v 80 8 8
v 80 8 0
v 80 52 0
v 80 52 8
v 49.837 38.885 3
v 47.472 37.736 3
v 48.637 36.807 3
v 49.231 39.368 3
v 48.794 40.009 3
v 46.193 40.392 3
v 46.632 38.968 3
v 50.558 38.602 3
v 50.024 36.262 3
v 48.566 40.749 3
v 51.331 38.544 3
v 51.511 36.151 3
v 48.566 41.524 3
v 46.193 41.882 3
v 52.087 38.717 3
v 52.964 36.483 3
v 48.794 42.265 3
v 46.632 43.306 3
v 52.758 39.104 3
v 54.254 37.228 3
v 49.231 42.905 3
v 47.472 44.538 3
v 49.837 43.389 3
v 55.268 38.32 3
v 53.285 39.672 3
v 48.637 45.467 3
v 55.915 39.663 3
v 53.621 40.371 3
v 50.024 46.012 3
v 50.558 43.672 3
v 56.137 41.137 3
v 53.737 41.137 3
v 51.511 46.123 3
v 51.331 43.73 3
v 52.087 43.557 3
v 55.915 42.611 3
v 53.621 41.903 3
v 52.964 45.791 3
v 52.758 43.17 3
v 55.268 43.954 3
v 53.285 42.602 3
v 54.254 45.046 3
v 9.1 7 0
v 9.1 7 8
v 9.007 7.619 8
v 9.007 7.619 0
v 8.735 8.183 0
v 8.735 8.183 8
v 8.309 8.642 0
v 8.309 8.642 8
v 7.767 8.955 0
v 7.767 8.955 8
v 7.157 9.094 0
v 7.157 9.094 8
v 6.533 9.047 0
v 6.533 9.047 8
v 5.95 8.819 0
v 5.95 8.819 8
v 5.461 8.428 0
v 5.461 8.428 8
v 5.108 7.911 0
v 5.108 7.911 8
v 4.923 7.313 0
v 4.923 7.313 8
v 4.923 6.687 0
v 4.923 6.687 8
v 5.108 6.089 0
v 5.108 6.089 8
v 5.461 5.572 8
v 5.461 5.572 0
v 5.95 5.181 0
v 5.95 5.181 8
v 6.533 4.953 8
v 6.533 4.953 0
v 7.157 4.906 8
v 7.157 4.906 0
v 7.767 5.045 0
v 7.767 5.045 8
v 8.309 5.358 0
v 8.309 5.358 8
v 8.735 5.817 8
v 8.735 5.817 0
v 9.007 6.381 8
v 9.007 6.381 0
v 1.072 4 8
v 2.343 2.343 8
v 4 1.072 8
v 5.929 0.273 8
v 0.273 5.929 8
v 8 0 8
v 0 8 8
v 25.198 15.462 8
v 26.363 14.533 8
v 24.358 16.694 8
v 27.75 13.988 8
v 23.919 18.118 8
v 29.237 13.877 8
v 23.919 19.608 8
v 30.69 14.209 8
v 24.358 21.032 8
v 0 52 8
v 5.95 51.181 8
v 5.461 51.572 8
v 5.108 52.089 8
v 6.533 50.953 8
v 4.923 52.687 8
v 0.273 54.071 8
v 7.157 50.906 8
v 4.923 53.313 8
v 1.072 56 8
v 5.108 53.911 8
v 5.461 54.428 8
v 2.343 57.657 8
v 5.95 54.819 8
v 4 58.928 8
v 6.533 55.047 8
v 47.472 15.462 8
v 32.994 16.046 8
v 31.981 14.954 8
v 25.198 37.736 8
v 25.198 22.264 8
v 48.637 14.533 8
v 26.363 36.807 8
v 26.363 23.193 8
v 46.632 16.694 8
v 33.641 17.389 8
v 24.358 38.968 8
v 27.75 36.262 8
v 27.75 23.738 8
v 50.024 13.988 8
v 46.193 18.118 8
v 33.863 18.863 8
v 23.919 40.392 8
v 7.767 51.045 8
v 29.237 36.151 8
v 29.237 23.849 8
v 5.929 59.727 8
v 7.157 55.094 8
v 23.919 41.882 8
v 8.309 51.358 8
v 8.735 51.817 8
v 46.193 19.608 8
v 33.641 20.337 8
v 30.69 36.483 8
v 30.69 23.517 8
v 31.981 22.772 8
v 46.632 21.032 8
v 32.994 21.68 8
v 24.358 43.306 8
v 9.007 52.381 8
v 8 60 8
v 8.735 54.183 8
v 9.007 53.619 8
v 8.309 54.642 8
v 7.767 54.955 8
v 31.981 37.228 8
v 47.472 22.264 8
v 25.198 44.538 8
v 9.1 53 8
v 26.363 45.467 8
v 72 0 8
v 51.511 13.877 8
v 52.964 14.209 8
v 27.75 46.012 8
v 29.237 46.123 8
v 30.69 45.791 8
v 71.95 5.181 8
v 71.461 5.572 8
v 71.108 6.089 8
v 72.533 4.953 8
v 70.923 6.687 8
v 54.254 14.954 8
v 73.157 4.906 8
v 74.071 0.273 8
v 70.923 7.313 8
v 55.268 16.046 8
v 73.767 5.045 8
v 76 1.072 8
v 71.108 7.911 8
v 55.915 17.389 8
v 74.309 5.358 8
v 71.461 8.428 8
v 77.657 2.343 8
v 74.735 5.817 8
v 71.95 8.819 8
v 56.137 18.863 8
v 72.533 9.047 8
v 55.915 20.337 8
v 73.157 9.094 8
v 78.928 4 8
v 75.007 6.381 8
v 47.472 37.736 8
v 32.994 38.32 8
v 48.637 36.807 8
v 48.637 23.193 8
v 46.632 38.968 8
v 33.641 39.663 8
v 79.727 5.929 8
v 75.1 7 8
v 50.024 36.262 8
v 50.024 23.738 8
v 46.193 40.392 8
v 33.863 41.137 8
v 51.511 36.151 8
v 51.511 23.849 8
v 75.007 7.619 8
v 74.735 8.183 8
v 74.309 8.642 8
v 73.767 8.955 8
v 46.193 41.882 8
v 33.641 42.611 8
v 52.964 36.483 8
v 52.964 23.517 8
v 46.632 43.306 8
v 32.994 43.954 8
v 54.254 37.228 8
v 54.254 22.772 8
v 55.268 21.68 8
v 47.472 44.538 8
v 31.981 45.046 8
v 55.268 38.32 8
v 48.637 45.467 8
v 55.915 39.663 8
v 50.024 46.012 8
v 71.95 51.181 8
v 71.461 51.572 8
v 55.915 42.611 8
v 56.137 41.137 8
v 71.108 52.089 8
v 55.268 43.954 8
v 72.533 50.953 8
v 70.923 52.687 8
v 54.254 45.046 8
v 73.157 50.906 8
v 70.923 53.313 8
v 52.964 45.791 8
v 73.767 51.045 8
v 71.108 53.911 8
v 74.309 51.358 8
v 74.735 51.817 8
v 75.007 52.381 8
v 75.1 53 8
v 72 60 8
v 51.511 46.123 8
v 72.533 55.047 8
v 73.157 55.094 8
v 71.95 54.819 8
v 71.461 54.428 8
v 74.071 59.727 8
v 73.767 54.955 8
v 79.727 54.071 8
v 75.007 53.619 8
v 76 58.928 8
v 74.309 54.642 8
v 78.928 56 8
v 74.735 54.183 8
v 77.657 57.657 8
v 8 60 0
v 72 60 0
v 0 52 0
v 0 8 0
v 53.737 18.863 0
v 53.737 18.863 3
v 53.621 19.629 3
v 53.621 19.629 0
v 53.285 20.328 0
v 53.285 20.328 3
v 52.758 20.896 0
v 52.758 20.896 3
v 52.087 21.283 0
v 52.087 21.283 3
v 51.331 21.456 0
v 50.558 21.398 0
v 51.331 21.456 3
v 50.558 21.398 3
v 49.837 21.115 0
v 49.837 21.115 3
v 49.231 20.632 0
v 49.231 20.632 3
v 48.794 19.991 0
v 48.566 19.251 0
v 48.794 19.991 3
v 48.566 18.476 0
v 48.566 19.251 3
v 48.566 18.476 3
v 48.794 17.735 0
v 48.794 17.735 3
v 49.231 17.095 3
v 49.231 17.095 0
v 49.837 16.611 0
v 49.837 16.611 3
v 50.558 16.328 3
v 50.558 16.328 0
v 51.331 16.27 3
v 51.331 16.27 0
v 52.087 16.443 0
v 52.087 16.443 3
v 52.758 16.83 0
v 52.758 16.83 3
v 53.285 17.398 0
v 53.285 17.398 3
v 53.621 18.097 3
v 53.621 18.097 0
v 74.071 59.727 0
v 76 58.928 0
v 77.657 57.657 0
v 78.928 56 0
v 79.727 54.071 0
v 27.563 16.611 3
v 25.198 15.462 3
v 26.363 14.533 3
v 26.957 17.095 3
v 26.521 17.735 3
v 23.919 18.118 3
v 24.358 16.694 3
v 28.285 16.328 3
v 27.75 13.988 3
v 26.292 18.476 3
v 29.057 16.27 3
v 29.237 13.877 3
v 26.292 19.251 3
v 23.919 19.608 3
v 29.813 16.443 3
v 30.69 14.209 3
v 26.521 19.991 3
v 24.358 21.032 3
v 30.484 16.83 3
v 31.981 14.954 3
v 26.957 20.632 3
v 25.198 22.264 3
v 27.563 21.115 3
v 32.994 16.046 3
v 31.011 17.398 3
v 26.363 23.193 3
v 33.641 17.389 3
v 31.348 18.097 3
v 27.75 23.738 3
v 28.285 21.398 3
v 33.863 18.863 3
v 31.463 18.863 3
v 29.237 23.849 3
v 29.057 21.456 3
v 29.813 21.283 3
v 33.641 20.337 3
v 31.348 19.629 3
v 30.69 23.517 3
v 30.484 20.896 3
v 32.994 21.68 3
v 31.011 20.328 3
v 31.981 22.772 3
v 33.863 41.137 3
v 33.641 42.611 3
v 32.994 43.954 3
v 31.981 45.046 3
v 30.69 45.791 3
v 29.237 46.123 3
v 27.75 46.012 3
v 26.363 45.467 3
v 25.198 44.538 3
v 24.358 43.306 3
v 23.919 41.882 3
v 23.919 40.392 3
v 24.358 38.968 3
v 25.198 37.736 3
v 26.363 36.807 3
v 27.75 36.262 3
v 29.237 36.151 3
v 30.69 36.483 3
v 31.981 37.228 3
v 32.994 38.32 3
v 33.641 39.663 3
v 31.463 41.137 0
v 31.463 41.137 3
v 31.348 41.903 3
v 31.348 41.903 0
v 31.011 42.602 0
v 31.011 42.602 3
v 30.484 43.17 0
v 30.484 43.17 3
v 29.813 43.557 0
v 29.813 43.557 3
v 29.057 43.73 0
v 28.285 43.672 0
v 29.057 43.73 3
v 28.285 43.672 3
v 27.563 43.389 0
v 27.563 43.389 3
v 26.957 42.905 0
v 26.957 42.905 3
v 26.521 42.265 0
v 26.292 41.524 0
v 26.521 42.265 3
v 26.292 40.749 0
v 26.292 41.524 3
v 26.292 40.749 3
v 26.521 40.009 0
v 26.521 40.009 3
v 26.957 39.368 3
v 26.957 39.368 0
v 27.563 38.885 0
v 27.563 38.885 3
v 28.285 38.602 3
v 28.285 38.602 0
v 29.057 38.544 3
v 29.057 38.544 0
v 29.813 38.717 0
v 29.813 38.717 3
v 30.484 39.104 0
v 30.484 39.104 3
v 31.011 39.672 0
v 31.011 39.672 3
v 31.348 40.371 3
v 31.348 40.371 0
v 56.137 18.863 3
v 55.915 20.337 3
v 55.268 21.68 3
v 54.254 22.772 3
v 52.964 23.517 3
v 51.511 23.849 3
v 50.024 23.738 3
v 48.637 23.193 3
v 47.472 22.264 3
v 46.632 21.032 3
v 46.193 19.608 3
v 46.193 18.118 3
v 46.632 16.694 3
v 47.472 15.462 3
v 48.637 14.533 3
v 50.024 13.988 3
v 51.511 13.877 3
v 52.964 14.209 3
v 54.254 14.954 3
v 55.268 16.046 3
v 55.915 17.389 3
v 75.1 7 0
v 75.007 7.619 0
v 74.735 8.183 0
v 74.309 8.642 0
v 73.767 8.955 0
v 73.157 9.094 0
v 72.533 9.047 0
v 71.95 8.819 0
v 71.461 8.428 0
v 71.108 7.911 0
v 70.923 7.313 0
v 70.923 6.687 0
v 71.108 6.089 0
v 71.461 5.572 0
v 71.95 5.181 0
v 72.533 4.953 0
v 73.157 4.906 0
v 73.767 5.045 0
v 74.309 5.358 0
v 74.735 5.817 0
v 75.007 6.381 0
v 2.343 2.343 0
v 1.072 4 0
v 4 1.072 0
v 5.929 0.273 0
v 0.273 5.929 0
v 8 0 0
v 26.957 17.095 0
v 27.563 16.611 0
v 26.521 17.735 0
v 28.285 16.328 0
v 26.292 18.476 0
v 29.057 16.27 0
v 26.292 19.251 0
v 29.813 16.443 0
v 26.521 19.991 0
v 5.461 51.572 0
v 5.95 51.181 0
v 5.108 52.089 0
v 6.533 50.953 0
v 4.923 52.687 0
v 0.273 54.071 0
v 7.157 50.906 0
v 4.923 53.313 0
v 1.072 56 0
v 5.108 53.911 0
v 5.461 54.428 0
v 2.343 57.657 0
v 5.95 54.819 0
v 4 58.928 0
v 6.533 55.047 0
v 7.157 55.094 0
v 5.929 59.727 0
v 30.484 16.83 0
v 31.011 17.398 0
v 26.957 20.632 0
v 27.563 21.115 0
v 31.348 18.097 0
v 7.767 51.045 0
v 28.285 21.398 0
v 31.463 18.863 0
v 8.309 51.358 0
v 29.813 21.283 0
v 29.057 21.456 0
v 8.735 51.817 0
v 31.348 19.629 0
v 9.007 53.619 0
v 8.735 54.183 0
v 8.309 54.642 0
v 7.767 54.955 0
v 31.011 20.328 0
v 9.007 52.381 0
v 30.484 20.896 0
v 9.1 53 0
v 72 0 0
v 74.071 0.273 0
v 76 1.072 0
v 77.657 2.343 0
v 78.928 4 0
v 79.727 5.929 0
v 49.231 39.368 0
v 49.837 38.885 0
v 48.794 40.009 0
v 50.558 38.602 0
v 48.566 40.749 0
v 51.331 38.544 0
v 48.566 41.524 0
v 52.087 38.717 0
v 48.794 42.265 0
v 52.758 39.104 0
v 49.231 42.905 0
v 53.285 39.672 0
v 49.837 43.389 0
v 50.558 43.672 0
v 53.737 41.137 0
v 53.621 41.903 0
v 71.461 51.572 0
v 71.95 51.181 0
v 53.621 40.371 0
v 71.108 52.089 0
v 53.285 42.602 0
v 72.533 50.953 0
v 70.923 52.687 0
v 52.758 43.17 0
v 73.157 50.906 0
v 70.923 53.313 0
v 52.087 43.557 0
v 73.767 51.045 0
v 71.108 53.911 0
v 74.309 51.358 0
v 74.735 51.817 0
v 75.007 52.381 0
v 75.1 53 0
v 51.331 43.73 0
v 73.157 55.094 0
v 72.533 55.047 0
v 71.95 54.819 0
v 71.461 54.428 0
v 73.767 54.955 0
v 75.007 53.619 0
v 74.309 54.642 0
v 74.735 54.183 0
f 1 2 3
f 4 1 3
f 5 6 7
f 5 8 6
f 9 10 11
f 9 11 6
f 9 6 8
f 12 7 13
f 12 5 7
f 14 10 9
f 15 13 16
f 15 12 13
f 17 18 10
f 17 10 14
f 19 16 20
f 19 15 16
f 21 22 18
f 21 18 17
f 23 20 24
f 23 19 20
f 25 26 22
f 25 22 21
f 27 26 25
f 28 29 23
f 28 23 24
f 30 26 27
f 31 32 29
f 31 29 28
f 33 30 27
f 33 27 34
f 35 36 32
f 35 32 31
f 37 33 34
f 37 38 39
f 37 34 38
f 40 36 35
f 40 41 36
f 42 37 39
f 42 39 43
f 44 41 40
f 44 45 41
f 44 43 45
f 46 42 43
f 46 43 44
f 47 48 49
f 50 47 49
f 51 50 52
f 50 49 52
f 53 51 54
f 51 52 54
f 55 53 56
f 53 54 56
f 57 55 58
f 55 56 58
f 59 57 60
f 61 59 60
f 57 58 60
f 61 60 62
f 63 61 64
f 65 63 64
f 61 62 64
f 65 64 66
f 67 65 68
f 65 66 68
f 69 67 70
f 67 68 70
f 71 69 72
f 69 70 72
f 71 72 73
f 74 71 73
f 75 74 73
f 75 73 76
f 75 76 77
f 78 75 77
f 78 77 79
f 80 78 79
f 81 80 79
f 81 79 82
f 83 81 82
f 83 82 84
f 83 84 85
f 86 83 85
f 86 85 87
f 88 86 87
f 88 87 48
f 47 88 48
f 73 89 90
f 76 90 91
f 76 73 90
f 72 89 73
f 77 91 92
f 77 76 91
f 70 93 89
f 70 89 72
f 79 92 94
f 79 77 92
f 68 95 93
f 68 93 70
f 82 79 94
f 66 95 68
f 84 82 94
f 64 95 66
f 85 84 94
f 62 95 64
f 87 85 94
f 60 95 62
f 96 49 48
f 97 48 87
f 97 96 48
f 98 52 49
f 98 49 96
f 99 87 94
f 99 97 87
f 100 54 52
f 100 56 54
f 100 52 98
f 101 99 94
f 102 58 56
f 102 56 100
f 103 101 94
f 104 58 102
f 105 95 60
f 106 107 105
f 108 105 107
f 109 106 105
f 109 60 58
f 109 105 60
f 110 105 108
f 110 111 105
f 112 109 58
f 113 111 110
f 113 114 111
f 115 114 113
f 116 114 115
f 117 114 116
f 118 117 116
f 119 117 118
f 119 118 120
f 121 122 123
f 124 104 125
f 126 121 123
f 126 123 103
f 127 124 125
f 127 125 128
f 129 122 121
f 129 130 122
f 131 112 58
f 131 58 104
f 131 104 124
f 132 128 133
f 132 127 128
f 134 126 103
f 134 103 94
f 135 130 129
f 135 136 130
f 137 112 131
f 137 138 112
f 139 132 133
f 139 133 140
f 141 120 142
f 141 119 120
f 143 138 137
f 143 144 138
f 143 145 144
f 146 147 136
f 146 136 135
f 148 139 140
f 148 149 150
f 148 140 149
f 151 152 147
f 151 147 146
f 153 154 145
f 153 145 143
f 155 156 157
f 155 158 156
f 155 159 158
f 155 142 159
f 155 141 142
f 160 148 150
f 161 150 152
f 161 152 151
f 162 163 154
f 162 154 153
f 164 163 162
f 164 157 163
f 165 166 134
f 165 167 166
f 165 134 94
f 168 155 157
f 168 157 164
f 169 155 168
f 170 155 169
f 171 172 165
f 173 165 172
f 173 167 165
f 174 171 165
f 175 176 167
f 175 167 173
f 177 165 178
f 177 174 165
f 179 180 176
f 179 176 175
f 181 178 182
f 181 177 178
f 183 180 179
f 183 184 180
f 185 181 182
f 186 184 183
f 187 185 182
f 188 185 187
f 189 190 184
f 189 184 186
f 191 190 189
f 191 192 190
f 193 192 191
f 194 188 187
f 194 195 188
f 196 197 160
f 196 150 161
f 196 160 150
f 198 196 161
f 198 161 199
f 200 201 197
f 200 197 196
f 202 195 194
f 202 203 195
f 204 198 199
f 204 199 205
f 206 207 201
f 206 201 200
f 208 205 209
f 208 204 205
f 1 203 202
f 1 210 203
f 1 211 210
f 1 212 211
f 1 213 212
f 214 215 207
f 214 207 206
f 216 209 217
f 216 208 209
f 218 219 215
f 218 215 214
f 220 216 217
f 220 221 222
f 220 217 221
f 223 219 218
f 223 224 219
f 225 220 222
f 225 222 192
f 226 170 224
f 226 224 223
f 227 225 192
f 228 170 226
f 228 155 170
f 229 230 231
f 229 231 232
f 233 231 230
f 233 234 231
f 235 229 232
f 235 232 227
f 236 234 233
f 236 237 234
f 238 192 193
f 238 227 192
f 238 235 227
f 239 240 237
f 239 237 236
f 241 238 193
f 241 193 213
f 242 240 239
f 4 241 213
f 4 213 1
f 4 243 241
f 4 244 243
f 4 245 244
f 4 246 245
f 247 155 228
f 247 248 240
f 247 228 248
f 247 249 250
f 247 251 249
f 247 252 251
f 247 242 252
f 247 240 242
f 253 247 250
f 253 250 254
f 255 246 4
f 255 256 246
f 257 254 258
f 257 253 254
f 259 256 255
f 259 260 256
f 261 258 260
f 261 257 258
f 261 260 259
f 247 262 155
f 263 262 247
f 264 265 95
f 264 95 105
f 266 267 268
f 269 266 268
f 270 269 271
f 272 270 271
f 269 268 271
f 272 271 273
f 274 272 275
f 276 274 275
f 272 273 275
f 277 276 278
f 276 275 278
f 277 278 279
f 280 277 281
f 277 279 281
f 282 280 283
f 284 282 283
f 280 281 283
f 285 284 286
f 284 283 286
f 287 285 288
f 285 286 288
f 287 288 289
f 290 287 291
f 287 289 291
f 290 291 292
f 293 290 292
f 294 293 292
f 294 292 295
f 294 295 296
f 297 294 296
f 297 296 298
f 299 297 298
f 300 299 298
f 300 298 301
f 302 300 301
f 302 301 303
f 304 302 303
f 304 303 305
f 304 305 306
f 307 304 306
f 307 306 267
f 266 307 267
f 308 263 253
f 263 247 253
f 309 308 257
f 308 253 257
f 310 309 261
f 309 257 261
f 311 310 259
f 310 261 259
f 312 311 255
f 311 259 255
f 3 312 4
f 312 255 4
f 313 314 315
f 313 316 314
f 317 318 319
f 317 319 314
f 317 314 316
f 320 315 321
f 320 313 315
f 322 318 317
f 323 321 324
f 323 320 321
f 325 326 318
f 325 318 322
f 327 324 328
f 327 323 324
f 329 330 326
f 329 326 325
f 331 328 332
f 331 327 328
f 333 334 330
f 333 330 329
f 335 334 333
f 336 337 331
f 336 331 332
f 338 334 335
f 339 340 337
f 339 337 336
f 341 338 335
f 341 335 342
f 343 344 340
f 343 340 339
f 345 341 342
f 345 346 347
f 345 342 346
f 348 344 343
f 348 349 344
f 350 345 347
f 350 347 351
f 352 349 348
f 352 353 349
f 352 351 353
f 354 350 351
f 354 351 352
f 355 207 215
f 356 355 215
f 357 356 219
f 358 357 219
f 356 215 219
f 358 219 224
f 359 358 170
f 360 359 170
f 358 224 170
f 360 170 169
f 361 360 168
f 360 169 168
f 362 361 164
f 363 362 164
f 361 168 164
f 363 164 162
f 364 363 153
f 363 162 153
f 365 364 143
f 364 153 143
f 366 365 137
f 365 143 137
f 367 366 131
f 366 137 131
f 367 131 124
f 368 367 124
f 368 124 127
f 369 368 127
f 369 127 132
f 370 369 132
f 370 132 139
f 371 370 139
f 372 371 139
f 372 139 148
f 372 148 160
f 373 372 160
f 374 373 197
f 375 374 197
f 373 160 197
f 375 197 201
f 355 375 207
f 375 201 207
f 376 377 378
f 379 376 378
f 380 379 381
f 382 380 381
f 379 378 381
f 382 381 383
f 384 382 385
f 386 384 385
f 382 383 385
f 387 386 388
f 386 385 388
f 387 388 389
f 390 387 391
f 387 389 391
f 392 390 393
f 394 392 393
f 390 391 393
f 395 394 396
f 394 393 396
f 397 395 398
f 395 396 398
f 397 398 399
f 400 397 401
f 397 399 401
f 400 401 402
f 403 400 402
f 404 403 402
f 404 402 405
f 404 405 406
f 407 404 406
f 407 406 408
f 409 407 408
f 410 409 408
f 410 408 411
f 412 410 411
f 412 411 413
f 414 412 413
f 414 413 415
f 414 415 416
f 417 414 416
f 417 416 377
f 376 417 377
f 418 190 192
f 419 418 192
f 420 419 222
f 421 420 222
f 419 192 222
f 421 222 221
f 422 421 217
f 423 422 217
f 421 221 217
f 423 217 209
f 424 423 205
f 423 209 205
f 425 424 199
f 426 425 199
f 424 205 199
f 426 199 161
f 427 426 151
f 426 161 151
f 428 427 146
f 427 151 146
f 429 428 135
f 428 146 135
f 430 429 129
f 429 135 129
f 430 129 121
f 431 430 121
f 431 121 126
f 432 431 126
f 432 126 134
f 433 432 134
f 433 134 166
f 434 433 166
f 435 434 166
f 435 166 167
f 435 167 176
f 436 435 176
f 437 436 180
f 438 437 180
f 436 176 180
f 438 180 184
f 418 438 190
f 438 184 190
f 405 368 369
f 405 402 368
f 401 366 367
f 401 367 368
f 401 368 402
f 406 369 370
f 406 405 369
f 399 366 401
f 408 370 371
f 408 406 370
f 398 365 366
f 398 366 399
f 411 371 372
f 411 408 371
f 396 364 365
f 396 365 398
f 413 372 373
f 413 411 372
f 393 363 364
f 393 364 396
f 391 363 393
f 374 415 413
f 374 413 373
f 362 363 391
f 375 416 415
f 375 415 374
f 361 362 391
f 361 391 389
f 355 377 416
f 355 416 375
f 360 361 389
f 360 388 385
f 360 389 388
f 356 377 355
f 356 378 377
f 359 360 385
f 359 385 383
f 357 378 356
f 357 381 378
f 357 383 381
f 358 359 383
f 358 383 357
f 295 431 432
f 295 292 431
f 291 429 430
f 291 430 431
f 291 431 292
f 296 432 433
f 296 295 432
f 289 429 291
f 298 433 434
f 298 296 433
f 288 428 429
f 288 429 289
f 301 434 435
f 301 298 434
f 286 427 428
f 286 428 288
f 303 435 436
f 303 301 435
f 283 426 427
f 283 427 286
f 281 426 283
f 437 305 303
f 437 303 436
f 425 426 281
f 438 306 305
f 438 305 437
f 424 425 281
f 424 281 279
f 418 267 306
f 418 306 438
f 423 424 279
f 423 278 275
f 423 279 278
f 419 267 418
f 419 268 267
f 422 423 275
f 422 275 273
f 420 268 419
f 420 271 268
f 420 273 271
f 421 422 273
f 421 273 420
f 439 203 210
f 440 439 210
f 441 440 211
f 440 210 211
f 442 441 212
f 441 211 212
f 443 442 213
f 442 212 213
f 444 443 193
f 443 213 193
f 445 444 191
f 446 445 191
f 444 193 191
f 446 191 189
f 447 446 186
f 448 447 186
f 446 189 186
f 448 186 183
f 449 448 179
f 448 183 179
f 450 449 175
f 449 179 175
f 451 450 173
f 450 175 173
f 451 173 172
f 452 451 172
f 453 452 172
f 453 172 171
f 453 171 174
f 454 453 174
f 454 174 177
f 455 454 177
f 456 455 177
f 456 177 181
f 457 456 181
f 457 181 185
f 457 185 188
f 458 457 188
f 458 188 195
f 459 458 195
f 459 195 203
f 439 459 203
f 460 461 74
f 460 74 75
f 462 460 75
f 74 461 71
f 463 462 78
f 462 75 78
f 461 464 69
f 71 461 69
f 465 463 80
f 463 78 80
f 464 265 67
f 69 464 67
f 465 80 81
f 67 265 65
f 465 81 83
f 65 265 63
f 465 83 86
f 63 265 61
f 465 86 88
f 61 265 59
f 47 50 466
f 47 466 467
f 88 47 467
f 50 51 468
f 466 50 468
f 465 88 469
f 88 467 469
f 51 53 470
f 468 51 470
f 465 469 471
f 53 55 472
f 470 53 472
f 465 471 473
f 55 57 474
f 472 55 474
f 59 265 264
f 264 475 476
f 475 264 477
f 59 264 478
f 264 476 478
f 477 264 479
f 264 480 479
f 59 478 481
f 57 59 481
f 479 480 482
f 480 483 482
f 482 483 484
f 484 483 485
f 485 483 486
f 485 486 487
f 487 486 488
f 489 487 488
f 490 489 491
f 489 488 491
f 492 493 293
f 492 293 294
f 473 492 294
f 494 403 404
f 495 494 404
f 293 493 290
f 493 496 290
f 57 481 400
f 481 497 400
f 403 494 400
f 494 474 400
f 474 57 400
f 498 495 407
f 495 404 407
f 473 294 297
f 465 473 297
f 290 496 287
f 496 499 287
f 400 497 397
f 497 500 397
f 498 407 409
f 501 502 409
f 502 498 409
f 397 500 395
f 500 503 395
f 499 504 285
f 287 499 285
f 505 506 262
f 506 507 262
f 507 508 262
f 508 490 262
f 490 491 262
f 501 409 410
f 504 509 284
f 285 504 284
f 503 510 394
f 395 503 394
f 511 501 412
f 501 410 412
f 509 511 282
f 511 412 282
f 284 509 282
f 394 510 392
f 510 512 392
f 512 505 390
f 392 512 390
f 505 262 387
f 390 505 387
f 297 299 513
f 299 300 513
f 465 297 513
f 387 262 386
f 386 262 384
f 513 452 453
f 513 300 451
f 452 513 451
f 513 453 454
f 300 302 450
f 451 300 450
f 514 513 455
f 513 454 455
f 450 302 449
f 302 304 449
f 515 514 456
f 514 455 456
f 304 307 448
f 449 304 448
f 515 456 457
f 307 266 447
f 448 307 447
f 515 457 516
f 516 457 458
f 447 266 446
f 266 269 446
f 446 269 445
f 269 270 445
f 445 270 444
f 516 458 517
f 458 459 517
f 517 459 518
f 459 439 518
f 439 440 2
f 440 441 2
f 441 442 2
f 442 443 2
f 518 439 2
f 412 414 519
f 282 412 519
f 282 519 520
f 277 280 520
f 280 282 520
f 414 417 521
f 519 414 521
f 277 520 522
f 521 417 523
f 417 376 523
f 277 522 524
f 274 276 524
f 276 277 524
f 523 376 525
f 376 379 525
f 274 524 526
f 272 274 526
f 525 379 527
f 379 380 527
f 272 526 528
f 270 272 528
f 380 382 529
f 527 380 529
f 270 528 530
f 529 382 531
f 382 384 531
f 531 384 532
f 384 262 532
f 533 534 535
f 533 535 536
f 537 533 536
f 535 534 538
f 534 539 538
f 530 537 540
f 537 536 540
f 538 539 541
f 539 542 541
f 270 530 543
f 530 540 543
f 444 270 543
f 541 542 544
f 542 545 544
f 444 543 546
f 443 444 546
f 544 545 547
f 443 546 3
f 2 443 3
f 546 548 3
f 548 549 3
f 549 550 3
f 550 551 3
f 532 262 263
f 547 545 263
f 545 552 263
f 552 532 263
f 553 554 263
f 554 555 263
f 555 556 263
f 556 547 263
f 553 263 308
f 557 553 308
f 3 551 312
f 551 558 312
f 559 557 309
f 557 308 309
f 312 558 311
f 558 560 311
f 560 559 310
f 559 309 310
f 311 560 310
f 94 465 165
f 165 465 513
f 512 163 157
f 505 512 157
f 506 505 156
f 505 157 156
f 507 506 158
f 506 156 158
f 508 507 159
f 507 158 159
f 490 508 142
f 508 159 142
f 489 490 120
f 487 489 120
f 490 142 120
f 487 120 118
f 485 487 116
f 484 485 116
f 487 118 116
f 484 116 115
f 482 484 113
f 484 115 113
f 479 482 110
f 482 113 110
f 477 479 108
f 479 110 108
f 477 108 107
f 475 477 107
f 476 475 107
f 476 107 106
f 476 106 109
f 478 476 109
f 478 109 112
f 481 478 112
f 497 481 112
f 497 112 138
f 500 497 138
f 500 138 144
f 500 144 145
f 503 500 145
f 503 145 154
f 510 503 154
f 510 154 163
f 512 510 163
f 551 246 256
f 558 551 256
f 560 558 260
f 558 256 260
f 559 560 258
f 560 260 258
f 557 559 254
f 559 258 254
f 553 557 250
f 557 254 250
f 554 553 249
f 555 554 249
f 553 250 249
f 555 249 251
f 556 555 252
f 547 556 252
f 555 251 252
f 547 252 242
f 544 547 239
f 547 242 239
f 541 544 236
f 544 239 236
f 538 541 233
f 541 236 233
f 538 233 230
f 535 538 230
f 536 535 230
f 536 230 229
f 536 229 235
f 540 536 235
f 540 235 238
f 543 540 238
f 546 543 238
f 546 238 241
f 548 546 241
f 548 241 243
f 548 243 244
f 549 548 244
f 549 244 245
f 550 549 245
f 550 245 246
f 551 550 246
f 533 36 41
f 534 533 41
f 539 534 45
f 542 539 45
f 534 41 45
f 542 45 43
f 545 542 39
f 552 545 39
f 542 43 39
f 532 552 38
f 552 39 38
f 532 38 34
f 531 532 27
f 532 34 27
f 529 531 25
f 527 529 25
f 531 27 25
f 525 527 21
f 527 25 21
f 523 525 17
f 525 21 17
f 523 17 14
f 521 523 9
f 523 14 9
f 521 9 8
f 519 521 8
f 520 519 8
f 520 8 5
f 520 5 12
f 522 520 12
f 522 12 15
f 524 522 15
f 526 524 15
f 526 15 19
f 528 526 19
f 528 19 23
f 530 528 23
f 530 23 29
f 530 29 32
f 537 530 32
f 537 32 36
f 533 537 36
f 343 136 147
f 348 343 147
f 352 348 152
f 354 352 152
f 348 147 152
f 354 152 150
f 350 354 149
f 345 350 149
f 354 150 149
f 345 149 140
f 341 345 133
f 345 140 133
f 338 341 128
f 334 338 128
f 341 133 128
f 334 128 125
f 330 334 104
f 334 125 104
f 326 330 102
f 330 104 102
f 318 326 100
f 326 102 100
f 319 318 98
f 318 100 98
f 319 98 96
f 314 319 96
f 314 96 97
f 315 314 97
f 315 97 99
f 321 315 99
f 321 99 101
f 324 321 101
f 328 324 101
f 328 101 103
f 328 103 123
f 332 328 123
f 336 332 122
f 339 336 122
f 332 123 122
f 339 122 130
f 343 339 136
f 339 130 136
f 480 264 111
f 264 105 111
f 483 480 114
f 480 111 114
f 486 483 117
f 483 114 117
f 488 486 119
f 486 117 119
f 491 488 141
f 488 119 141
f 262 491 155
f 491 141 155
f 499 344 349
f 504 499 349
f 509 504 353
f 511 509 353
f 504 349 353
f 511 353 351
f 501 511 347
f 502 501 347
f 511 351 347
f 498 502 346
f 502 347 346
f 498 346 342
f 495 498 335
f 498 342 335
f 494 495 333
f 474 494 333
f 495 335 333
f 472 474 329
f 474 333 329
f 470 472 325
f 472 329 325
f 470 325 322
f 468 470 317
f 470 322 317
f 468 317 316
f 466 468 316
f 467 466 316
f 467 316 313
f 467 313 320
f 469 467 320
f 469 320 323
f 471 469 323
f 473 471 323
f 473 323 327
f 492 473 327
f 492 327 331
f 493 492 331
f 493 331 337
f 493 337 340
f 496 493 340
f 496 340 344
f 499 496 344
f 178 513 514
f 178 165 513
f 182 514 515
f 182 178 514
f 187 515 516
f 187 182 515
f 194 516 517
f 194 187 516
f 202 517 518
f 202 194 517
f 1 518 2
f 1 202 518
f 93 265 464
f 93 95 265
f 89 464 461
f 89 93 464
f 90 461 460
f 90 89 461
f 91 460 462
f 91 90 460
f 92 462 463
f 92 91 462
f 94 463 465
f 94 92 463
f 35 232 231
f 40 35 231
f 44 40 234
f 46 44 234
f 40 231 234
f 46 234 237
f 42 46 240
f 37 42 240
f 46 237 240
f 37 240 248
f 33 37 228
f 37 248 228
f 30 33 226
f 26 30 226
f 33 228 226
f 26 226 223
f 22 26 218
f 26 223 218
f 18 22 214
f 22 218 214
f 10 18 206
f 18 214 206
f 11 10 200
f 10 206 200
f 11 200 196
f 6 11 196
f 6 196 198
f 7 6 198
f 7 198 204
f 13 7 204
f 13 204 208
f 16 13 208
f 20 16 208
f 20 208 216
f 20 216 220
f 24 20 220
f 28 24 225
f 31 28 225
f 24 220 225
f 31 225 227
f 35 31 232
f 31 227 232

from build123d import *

# Parameters (mm, degrees)
SKETCH_1_W          = 80
SKETCH_1_H          = 60
EXTRUDE_1_DEPTH     = 8
SKETCH_2_R          = 2.6
CUT_EXTRUDE_1_DEPTH = 10
FILLET_1_R          = 8
SKETCH_3_R          = 5
CUT_EXTRUDE_2_DEPTH = 5
SKETCH_5_R          = 2.1
CUT_EXTRUDE_4_DEPTH = 10


with BuildPart() as part:
    # ｽｹｯﾁ1 → ﾎﾞｽ - 押し出し1 (new body)
    with BuildSketch(Plane.XY):
        with Locations((40, 30)):
            Rectangle(SKETCH_1_W, SKETCH_1_H)
    extrude(amount=EXTRUDE_1_DEPTH)

    # ｽｹｯﾁ2 → ｶｯﾄ - 押し出し1 (cut)
    with BuildSketch(Plane.XY.offset(8)):
        with Locations((28.863068196, 41.136931804)):
            Circle(SKETCH_2_R)
        with Locations((51.136931804, 41.136931804)):
            Circle(SKETCH_2_R)
        with Locations((51.136931804, 18.863068196)):
            Circle(SKETCH_2_R)
        with Locations((28.863068196, 18.863068196)):
            Circle(SKETCH_2_R)
    extrude(amount=-CUT_EXTRUDE_1_DEPTH, mode=Mode.SUBTRACT)

    # ﾌｨﾚｯﾄ1
    fillet_1_edges = [part.edges().sort_by_distance(p)[0] for p in [
        (0, 60, 4),
        (80, 60, 4),
        (80, 0, 4),
        (0, 0, 4),
    ]]
    fillet(fillet_1_edges, radius=FILLET_1_R)

    # ｽｹｯﾁ3 → ｶｯﾄ - 押し出し2 (cut)
    with BuildSketch(Plane.XY.offset(8)):
        with Locations((28.863068196, 41.136931804)):
            Circle(SKETCH_3_R)
        with Locations((51.136931804, 41.136931804)):
            Circle(SKETCH_3_R)
        with Locations((28.863068196, 18.863068196)):
            Circle(SKETCH_3_R)
        with Locations((51.136931804, 18.863068196)):
            Circle(SKETCH_3_R)
    extrude(amount=-CUT_EXTRUDE_2_DEPTH, mode=Mode.SUBTRACT)

    # ｽｹｯﾁ5 → ｶｯﾄ - 押し出し4 (cut)
    with BuildSketch(Plane.XY.offset(8)):
        with Locations((7, 53)):
            Circle(SKETCH_5_R)
        with Locations((73, 53)):
            Circle(SKETCH_5_R)
        with Locations((73, 7)):
            Circle(SKETCH_5_R)
        with Locations((7, 7)):
            Circle(SKETCH_5_R)
    extrude(amount=-CUT_EXTRUDE_4_DEPTH, mode=Mode.SUBTRACT)


solid = part.part
